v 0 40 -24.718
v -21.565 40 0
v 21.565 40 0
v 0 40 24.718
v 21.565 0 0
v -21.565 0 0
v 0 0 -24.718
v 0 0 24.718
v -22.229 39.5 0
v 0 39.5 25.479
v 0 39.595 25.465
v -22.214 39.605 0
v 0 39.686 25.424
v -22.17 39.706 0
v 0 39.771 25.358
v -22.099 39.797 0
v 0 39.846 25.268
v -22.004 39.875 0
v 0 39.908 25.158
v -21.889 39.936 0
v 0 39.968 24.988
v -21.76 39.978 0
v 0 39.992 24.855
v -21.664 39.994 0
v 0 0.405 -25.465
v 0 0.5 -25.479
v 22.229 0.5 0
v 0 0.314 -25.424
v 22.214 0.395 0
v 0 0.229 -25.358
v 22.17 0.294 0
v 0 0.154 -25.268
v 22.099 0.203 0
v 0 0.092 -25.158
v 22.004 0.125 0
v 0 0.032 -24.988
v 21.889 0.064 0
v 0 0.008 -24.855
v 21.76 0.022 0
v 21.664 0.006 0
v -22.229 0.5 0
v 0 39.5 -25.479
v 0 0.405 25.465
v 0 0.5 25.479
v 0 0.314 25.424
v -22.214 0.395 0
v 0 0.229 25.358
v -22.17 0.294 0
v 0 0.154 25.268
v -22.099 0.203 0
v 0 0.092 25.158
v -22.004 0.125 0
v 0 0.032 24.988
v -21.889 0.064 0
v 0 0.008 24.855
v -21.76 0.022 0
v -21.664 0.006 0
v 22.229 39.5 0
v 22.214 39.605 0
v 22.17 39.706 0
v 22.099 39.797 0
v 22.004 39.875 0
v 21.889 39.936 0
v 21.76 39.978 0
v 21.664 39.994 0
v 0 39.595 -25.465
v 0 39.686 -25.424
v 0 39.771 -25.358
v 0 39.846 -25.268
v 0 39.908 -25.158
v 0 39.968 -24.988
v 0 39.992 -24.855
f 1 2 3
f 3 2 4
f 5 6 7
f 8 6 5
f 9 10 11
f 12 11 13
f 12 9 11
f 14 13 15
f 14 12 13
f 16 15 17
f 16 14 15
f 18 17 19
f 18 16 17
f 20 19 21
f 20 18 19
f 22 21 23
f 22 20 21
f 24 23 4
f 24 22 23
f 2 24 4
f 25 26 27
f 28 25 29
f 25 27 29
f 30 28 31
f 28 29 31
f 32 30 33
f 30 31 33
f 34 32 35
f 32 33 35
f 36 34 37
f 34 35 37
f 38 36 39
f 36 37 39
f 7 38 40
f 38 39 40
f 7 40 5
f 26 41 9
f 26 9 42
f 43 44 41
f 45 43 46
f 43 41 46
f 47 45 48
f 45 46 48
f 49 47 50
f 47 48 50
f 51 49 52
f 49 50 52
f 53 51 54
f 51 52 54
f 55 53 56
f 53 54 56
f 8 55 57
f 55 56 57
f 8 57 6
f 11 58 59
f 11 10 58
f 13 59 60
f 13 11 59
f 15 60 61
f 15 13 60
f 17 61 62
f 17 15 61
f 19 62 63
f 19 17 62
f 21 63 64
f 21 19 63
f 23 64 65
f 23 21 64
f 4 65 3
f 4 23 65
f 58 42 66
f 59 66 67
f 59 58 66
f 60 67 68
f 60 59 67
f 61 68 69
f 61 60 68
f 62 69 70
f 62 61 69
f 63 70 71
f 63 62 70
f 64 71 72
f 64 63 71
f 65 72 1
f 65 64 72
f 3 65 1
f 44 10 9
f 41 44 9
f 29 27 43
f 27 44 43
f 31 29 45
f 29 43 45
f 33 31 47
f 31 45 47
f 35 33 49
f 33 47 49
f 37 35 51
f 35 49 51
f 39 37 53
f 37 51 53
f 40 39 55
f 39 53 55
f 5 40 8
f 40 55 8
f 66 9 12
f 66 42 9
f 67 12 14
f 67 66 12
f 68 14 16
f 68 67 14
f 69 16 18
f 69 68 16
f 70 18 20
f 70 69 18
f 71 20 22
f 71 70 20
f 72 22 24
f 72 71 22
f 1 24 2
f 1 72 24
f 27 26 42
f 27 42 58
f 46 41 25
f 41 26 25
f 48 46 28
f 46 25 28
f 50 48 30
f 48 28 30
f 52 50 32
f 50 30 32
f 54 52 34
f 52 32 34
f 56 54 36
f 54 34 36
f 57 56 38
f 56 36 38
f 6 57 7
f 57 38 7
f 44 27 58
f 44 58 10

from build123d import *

# Parameters (mm, degrees)
BOSS_EXTRUDE1_DEPTH = 40
FILLET1_R           = 0.5


with BuildPart() as part:
    # Sketch1 → Boss-Extrude1 (new body)
    with BuildSketch(Plane(origin=(0, 0, 0), x_dir=(-1, 0, 0), z_dir=(0, 1, 0))):
        Polygon((22.228552834, -5.26e-07), (0, -25.478873765), (-22.228552834, -5.26e-07), (0, 25.478872714), align=None)
    extrude(amount=BOSS_EXTRUDE1_DEPTH)

    # Fillet1
    fillet1_edges = [part.edges().sort_by_distance(p)[0] for p in [
        (11.114276417, 40, -12.739437146),
        (-11.114276417, 40, -12.739437146),
        (-11.114276417, 40, 12.739436094),
        (-11.114276417, 0, -12.739437146),
        (11.114276417, 0, -12.739437146),
        (11.114276417, 0, 12.739436094),
        (-11.114276417, 0, 12.739436094),
        (11.114276417, 40, 12.739436094),
    ]]
    fillet(fillet1_edges, radius=FILLET1_R)


solid = part.part
